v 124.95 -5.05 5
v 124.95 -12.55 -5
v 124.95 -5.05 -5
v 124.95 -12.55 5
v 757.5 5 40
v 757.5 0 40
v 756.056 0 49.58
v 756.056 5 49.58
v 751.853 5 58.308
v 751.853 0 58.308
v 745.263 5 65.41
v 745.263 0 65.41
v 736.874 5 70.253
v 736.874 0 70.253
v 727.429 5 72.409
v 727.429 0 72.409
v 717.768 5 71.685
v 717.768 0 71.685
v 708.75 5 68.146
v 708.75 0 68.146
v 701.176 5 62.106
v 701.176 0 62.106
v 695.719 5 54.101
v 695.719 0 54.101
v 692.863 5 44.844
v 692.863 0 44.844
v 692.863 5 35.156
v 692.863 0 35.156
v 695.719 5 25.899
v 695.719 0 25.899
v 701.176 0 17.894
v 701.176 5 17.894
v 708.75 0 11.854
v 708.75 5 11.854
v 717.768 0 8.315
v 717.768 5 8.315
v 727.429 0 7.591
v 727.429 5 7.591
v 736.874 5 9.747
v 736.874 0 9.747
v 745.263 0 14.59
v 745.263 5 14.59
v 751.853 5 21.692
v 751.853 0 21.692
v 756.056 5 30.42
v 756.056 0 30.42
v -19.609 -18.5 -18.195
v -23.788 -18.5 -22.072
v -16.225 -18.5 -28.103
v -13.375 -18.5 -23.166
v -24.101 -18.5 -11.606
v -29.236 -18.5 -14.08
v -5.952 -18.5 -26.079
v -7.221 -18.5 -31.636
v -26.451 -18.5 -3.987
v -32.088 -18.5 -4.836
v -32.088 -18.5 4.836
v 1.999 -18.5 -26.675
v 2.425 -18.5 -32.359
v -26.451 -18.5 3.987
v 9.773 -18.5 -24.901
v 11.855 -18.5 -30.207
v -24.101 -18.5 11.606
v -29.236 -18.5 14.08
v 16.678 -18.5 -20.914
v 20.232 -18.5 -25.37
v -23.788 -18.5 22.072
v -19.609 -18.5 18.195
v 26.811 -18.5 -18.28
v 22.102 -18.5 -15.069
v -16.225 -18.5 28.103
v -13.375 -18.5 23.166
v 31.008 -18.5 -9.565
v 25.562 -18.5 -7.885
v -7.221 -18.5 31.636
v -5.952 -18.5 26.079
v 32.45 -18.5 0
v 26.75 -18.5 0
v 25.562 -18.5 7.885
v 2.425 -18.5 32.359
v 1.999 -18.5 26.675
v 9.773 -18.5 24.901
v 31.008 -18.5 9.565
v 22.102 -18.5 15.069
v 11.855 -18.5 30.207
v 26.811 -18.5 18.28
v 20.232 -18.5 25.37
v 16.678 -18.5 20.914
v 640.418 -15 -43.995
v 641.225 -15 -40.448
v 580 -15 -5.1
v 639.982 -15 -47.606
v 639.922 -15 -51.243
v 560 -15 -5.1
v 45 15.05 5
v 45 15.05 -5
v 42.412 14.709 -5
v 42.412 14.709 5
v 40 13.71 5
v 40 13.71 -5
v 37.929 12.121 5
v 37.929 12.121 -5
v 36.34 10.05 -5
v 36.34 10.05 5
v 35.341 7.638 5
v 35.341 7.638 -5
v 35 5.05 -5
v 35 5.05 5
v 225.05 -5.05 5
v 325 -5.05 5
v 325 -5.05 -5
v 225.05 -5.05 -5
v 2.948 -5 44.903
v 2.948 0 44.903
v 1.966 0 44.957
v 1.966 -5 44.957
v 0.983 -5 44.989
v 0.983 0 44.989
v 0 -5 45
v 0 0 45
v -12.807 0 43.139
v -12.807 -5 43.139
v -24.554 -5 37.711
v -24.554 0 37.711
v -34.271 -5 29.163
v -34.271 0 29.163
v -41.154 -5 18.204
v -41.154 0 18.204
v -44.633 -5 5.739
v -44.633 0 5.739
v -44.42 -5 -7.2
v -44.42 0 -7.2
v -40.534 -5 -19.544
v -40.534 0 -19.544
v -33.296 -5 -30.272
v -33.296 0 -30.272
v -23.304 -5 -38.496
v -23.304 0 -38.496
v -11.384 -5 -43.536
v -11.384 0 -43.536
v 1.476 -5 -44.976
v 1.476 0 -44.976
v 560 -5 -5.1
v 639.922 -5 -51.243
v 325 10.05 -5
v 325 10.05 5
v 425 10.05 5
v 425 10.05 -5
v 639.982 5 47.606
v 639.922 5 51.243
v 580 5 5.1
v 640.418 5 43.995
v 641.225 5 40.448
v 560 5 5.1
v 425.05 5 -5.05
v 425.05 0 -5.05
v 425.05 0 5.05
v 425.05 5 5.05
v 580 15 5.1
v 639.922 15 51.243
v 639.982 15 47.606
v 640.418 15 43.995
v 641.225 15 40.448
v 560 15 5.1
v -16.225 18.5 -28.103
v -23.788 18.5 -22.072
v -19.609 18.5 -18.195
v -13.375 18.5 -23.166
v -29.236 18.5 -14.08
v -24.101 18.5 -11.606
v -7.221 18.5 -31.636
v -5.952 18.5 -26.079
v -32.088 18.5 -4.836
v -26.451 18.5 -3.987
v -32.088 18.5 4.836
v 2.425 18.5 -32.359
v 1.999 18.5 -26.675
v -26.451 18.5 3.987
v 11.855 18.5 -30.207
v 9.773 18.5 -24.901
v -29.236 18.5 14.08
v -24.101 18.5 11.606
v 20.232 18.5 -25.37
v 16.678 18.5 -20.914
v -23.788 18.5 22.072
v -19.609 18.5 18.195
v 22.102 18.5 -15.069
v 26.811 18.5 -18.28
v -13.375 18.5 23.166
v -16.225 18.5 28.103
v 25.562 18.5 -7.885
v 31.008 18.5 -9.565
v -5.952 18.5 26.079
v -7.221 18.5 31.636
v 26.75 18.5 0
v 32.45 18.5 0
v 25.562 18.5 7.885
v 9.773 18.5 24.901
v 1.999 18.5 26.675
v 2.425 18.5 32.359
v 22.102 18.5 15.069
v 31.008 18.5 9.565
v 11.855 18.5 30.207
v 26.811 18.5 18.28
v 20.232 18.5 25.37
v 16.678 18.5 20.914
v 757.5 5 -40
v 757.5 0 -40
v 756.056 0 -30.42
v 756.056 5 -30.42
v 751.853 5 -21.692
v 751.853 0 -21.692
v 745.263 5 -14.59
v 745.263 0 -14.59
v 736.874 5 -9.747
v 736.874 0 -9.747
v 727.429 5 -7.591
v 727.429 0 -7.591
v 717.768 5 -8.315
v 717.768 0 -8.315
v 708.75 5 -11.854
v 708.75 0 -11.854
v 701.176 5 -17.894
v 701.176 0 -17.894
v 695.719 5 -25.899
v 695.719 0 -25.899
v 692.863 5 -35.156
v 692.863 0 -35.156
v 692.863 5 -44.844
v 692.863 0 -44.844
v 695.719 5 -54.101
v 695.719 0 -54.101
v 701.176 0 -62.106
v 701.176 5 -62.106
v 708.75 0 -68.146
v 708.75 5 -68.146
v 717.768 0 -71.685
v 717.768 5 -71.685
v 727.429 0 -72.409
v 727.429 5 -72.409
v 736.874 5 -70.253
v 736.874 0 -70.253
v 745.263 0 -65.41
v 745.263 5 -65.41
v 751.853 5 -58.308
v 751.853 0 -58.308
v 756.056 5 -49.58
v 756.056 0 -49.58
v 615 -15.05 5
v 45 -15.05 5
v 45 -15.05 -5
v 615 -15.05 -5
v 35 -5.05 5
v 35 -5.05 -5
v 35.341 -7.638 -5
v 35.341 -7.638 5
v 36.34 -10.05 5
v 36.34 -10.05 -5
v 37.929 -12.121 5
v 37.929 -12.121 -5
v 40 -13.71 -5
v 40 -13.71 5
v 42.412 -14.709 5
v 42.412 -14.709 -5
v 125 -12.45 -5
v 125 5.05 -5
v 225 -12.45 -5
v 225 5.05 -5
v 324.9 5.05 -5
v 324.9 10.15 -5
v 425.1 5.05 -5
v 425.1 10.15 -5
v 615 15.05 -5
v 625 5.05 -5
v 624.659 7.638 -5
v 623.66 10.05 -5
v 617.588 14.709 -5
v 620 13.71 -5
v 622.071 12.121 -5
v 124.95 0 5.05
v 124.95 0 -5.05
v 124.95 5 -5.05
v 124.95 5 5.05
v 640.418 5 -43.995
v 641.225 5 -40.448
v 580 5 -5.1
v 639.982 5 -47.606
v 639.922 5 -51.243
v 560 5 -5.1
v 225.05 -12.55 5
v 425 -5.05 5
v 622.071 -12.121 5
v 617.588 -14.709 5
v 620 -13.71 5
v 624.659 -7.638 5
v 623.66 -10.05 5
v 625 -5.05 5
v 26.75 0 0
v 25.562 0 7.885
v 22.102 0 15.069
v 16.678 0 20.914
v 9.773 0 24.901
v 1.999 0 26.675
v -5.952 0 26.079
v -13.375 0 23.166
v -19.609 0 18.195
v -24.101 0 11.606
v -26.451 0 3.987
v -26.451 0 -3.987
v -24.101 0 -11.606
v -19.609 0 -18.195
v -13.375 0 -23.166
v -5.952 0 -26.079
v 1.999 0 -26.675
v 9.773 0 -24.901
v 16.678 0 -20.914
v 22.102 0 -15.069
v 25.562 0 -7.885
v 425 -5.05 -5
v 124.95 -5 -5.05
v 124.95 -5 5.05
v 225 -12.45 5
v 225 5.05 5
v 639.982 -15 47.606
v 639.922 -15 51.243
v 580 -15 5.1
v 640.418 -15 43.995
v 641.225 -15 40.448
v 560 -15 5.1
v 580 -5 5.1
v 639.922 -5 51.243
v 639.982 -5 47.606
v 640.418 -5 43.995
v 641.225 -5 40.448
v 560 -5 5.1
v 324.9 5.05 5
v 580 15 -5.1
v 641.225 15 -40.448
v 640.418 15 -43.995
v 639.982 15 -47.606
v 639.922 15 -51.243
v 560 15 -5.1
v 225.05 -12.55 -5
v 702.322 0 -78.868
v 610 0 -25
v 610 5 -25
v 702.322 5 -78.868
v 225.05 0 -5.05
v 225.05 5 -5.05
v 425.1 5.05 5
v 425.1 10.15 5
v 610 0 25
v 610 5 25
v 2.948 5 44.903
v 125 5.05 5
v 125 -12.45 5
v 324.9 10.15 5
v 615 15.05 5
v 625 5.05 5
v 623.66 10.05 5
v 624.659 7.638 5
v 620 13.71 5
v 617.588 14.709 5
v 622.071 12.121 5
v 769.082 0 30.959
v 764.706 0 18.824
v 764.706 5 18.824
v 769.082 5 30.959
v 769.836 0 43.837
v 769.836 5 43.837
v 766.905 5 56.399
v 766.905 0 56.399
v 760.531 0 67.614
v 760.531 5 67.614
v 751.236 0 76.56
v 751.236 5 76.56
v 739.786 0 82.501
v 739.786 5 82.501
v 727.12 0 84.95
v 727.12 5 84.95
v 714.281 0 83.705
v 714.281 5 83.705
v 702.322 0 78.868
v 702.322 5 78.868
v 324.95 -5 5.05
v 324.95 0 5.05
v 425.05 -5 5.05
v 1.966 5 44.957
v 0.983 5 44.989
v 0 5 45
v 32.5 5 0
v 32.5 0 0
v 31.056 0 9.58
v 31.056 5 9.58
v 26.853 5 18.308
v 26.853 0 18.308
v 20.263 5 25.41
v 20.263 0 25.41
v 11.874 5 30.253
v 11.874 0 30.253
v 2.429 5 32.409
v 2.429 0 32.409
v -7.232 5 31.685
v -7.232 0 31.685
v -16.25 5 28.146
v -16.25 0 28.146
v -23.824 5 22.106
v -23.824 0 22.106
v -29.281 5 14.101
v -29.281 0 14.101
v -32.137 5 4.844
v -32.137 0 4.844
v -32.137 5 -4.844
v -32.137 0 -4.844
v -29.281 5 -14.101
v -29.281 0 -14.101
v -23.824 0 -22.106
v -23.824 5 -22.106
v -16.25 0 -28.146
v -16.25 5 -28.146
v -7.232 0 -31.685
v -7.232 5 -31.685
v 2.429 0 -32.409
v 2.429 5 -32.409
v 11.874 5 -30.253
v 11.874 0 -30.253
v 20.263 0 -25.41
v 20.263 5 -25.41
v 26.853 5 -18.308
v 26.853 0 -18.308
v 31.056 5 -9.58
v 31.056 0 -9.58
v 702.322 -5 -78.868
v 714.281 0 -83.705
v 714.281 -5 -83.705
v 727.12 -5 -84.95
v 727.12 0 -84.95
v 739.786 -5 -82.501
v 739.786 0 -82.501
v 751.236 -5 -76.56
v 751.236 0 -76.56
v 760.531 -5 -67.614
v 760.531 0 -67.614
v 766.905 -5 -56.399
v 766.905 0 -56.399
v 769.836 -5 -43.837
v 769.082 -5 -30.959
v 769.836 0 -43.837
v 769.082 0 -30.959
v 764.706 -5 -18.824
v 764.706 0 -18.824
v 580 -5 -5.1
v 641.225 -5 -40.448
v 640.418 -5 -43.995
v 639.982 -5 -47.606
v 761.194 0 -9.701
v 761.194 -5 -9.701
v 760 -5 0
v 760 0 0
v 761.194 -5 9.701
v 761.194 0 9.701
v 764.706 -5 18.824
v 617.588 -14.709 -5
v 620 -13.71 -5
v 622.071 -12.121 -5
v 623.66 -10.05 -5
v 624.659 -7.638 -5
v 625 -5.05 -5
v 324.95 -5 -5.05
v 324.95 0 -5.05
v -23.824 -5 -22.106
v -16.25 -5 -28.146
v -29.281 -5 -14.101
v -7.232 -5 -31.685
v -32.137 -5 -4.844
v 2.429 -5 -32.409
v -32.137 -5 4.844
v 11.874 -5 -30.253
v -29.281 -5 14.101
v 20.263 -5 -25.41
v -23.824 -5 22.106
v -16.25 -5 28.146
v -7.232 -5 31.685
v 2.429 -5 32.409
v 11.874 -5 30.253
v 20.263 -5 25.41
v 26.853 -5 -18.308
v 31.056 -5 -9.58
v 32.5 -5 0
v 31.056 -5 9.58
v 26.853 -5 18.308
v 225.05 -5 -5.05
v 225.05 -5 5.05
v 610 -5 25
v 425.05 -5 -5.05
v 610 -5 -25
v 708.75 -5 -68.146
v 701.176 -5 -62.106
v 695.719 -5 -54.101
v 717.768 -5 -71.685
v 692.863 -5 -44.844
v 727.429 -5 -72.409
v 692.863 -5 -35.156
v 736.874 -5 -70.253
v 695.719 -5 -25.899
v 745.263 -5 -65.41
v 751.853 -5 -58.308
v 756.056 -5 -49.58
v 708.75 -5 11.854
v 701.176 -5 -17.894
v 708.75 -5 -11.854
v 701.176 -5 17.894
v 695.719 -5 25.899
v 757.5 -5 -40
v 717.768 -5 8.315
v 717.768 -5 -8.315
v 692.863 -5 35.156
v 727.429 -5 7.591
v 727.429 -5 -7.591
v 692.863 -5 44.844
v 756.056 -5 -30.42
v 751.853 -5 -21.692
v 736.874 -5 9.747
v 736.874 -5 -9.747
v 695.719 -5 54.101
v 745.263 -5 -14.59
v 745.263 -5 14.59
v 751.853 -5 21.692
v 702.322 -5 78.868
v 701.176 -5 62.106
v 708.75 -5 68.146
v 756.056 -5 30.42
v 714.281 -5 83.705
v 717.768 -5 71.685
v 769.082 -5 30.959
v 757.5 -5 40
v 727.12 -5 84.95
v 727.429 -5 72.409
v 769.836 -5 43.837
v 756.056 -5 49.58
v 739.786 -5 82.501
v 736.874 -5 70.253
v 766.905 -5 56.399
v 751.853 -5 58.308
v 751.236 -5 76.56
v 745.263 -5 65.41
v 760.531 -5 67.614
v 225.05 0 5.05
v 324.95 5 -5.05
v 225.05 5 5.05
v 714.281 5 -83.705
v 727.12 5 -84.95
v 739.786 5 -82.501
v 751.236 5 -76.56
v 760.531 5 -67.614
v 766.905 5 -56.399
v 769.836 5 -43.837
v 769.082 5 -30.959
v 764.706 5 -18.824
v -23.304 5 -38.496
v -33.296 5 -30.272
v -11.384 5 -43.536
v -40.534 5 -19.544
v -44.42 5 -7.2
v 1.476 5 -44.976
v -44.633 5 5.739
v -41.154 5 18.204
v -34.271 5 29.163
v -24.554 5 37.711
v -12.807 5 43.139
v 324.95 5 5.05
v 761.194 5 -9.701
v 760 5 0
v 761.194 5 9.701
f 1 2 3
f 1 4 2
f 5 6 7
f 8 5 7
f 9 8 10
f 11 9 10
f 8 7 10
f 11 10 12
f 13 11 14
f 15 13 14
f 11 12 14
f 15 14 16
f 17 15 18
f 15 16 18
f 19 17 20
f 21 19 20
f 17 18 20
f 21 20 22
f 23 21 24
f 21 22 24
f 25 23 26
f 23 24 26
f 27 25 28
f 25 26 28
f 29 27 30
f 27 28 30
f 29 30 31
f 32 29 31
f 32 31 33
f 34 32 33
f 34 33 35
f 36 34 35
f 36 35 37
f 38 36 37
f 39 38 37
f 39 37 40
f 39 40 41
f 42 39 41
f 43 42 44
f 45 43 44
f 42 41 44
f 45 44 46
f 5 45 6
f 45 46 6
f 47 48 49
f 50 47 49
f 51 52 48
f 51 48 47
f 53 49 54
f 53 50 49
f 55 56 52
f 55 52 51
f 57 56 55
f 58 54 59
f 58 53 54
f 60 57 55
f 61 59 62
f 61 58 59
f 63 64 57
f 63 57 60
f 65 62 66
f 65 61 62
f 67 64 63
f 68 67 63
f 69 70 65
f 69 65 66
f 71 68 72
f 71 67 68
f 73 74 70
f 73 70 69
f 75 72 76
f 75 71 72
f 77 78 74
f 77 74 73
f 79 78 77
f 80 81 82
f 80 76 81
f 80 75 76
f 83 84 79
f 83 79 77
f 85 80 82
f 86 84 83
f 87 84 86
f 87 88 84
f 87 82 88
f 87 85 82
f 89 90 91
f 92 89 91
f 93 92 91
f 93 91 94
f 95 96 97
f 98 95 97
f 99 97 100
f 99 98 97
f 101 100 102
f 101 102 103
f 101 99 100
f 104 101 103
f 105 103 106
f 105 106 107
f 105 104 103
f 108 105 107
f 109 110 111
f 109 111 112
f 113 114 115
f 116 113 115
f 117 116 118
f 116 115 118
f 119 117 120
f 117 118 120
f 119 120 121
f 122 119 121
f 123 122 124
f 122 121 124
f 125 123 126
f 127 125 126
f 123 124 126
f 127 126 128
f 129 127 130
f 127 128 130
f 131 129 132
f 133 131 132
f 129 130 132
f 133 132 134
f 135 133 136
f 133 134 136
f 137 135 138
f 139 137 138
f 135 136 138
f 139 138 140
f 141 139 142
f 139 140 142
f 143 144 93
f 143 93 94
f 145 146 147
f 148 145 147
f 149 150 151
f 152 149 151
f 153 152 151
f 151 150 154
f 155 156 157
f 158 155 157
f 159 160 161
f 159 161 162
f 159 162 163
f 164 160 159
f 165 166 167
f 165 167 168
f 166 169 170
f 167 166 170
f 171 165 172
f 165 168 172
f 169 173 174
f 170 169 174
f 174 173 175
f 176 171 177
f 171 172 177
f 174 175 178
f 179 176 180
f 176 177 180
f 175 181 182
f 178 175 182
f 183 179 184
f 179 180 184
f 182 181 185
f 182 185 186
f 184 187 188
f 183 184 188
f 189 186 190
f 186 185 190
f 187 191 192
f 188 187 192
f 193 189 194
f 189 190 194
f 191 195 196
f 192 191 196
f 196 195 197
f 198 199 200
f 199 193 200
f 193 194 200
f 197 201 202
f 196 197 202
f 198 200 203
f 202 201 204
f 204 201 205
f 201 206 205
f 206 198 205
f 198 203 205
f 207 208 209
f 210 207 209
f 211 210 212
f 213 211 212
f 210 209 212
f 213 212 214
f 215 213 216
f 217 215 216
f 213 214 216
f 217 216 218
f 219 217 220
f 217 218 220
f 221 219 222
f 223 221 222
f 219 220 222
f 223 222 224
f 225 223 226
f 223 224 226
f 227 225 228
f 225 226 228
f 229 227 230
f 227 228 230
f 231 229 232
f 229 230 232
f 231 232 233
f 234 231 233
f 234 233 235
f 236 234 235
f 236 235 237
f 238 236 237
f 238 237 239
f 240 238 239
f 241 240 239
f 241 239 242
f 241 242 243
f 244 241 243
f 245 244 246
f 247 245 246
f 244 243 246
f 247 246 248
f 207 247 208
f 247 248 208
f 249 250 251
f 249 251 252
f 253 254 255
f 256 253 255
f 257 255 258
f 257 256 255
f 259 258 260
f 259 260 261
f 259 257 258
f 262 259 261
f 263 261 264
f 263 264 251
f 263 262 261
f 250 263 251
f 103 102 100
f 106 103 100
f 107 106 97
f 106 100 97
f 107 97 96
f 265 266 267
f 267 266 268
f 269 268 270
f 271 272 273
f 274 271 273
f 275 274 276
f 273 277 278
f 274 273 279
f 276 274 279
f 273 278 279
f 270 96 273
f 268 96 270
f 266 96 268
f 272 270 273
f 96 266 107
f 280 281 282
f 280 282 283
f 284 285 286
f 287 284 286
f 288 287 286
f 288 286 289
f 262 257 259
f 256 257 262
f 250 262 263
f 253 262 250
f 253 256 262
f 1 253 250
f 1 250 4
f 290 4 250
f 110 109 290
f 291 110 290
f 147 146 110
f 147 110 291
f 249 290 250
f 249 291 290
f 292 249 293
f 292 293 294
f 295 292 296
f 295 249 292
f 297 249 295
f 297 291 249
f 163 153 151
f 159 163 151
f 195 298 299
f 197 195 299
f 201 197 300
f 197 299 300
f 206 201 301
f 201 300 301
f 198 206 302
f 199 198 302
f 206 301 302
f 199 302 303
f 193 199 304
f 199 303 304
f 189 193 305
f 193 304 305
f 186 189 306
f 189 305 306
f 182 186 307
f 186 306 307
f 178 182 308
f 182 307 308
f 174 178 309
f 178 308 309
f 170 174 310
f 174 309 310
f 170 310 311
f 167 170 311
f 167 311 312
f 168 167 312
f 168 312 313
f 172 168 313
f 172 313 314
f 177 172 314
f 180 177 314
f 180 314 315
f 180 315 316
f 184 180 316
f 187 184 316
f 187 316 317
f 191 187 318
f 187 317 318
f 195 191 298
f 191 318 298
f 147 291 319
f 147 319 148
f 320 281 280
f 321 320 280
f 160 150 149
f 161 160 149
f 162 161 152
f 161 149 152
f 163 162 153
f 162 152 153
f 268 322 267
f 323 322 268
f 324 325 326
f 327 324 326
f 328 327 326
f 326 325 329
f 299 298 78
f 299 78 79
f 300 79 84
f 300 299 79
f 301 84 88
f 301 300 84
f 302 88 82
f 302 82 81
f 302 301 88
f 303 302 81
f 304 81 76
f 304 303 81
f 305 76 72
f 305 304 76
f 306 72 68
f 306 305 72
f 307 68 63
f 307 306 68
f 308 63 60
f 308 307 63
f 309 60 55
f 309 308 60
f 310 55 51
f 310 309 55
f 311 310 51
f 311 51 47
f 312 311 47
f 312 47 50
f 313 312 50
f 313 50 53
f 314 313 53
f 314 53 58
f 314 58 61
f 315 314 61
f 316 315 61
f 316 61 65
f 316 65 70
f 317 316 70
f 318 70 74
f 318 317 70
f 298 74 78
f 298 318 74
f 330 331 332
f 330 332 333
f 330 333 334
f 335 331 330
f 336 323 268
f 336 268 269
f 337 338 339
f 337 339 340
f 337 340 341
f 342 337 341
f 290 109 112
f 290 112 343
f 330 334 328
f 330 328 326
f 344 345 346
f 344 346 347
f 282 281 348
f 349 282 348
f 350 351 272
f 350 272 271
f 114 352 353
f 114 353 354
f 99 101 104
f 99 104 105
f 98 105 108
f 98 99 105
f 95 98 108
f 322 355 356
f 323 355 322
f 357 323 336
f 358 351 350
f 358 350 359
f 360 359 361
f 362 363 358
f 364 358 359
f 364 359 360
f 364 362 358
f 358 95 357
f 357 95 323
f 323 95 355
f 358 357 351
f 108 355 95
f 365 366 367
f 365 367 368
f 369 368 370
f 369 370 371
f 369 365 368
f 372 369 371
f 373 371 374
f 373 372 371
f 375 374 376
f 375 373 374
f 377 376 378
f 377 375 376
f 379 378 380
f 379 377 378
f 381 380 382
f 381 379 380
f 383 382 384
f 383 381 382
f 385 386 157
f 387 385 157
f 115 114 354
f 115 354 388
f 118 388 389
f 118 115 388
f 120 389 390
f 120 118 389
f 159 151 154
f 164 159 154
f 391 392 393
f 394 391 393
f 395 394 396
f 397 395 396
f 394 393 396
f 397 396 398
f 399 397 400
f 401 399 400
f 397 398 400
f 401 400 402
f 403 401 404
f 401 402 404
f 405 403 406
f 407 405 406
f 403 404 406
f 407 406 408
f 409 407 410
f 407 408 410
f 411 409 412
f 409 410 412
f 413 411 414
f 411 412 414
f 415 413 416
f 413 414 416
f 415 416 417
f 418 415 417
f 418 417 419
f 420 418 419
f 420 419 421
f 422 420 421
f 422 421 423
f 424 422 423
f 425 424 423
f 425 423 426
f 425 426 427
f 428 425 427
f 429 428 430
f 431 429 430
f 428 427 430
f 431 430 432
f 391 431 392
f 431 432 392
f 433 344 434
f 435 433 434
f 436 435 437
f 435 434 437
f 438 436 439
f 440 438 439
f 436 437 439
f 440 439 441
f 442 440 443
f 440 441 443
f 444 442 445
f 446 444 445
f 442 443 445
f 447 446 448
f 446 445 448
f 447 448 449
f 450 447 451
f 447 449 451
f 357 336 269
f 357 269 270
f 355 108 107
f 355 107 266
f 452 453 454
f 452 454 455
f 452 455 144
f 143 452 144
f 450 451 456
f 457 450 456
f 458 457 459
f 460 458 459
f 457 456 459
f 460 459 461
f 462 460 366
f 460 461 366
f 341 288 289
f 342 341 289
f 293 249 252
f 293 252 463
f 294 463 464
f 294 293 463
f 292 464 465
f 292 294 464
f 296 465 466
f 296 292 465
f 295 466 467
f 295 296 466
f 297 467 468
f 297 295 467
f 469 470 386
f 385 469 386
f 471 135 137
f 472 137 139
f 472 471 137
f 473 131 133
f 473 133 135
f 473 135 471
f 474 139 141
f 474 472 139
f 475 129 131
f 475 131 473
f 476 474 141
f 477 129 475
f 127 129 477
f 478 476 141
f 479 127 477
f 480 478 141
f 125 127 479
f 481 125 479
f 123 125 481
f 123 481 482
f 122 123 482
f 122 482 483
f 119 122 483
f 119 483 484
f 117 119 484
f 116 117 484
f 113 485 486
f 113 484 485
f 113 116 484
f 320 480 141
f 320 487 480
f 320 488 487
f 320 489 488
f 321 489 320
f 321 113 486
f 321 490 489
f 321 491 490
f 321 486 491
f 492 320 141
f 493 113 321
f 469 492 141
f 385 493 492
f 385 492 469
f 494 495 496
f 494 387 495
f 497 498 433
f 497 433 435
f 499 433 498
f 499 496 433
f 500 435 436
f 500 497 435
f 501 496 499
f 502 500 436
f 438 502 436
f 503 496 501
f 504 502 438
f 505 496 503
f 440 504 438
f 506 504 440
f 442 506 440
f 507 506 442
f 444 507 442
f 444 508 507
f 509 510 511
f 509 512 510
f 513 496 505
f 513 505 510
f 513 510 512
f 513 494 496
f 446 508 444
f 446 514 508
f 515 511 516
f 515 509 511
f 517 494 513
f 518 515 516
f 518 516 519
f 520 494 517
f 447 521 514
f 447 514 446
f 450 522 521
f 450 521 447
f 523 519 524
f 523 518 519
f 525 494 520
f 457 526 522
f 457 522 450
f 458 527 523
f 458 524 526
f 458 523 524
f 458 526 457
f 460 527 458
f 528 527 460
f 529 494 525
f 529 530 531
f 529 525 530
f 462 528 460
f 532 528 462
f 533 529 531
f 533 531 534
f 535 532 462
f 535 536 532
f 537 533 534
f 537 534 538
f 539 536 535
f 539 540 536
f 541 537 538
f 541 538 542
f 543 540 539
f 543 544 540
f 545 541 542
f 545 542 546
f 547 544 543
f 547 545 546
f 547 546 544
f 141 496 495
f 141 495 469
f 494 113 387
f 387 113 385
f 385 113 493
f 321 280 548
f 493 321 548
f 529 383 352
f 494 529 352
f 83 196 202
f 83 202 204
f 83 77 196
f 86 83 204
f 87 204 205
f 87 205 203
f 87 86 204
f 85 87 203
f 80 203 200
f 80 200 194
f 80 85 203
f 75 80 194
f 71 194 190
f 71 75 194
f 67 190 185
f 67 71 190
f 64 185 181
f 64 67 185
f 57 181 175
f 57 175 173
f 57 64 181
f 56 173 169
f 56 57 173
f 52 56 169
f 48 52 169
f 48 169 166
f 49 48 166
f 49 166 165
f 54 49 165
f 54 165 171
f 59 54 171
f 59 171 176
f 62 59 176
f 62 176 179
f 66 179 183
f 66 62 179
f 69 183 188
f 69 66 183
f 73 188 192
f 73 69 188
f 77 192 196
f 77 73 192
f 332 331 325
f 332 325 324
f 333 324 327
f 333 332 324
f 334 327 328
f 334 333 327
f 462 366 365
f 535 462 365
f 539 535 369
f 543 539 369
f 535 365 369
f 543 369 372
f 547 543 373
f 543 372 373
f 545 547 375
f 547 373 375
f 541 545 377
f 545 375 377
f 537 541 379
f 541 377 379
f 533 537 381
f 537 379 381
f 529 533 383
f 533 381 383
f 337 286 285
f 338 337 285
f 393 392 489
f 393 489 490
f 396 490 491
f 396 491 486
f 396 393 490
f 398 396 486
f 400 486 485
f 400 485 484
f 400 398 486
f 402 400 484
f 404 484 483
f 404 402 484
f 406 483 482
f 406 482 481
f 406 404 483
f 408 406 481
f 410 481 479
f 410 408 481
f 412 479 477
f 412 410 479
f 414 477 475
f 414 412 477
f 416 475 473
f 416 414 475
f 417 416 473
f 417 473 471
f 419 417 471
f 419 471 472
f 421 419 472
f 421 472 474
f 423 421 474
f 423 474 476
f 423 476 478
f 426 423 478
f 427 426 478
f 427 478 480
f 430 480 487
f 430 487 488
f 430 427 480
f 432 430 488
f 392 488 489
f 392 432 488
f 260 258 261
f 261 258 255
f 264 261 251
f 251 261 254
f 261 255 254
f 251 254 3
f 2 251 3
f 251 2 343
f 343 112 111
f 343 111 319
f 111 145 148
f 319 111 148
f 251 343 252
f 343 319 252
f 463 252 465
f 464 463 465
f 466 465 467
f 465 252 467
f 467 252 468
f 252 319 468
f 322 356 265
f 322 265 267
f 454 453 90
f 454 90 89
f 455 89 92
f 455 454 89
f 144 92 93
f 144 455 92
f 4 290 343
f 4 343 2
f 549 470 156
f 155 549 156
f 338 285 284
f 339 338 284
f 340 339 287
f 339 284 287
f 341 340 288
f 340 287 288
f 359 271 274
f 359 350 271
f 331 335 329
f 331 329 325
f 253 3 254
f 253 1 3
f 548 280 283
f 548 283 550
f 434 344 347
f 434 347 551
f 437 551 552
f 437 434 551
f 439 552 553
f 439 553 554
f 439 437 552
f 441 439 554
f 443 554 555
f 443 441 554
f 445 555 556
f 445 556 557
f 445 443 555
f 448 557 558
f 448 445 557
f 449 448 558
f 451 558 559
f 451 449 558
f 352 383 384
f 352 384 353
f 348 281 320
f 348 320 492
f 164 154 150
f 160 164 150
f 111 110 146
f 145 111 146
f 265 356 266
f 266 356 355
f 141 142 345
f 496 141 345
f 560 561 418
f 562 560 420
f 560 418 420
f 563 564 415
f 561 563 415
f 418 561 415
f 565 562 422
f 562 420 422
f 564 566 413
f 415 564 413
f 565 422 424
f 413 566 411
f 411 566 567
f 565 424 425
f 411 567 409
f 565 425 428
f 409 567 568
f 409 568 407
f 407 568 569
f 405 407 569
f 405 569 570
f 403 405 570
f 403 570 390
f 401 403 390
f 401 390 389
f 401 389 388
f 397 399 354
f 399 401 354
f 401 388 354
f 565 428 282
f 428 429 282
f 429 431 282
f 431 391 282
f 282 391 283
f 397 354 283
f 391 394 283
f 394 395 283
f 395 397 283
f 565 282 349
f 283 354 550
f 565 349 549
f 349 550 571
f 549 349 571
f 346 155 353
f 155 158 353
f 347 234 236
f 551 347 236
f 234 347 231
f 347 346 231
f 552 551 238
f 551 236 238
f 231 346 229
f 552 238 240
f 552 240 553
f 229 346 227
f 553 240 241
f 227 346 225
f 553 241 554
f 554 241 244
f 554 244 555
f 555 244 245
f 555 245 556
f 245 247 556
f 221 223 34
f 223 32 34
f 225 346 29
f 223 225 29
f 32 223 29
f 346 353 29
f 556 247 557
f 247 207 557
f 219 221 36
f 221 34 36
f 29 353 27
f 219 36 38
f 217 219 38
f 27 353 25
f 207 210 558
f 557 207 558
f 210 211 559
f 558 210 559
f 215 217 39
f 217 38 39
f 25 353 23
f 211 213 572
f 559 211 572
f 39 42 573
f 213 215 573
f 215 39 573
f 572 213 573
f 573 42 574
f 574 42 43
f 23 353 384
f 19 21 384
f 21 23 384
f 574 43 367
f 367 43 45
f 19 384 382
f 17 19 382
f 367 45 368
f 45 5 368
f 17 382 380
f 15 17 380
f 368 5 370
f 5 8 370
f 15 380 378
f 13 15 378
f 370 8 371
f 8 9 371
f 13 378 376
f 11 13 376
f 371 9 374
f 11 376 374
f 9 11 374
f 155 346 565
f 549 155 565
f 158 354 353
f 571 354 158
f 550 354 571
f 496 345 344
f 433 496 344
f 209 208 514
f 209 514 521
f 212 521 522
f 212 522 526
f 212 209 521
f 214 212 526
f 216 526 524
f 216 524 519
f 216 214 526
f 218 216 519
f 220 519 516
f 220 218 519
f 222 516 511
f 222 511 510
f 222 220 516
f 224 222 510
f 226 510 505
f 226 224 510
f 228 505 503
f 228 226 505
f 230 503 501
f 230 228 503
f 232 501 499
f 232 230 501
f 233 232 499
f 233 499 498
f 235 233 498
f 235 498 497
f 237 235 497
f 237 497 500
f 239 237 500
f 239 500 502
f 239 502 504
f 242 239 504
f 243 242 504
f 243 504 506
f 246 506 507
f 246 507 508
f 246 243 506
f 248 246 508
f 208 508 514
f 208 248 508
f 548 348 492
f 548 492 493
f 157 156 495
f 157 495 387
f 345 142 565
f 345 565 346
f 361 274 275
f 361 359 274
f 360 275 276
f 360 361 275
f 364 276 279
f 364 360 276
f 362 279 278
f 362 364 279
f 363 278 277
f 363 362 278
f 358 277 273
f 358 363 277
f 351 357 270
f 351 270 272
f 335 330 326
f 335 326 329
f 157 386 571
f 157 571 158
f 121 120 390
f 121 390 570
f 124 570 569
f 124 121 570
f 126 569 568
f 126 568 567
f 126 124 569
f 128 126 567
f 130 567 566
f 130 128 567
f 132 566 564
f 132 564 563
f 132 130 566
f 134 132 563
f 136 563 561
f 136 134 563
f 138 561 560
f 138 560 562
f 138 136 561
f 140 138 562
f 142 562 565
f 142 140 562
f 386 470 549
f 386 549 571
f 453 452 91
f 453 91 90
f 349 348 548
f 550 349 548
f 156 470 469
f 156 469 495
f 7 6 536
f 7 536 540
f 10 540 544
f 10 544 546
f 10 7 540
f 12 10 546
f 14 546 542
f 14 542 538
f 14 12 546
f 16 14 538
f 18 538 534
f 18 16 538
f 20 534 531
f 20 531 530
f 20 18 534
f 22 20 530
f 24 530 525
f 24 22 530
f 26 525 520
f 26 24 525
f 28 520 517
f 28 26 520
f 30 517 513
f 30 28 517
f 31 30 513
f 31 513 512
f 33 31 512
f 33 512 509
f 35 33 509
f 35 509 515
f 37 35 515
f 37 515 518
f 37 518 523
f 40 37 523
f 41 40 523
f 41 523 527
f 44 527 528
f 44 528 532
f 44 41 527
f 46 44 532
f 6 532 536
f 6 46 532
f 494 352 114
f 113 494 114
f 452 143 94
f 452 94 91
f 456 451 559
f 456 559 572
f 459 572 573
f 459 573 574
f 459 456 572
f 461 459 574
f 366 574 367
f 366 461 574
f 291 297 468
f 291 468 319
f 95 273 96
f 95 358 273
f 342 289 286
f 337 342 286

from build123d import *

# Parameters (mm, degrees)
F0_R          = 32.5
F0_W          = 100.1
F0_H          = 10.1
F1_DEPTH      = 5
F1_DEPTH_BACK = 5
F2_W          = 100
F2_H          = 17.5
F3_DEPTH      = 5
F3_DEPTH_BACK = 5
F2_H_2        = 15.1
F5_DEPTH      = 10
F7_R          = 32.45
F7_R_2        = 26.75
F8_DEPTH      = 18.5
F8_DEPTH_BACK = 18.5


with BuildPart() as f1:
    # F0 (on Front) → F1 (new body, two sides)
    with BuildSketch(Plane.XZ) as f1_sk:
        with BuildLine():
            ThreePointArc((1.4764017016, -44.9757739012), (32.3375793511, -31.2934651599), (45, 0))
            ThreePointArc((45, 0), (32.8454281088, 30.7600041019), (2.9476510067, 44.9033557047))
            Line((2.9476510067, 44.9033557047), (0, 45))
            ThreePointArc((0, 45), (-44.9939430677, -0.7383002249), (1.4764017016, -44.9757739012))
        make_face()
        Circle(F0_R, mode=Mode.SUBTRACT)
        with BuildLine():
            ThreePointArc((2.9476510067, 44.9033557047), (32.8454281088, 30.7600041019), (45, 0))
            ThreePointArc((45, 0), (32.3375793511, -31.2934651599), (1.4764017016, -44.9757739012))
            Line((1.4764017016, -44.9757739012), (610, -25))
            Line((610, -25), (702.3216164051, -78.8676075611))
            ThreePointArc((702.3216164051, -78.8676075611), (756.2058769896, -72.4221103772), (764.7058823529, -18.8235294118))
            ThreePointArc((764.7058823529, -18.8235294118), (760, 0), (764.7058823529, 18.8235294118))
            ThreePointArc((764.7058823529, 18.8235294118), (693.7941230104, 7.5778896228), (702.3216164051, 78.8676075611))
            Line((702.3216164051, 78.8676075611), (610, 25))
            Line((610, 25), (2.9476510067, 44.9033557047))
        make_face()
        with Locations((725, -40)):
            Circle(F0_R, mode=Mode.SUBTRACT)
        with Locations((175, 0)):
            Rectangle(F0_W, F0_H, mode=Mode.SUBTRACT)
        with Locations((375, 0)):
            Rectangle(F0_W, F0_H, mode=Mode.SUBTRACT)
        with BuildLine():
            Line((0, 45), (2.9476510067, 44.9033557047))
            ThreePointArc((2.9476510067, 44.9033557047), (1.4746174569, 44.9758324365), (0, 45))
        make_face()
        with BuildLine():
            ThreePointArc((770, 40), (747.4106307166, 79.0226041018), (702.3216164051, 78.8676075611))
            ThreePointArc((702.3216164051, 78.8676075611), (693.7941230104, 7.5778896228), (764.7058823529, 18.8235294118))
            ThreePointArc((764.7058823529, 18.8235294118), (768.6564125065, 29.0858968734), (770, 40))
        make_face()
        with Locations((725, 40)):
            Circle(F0_R, mode=Mode.SUBTRACT)
    extrude(amount=F1_DEPTH)
    extrude(f1_sk.sketch, amount=-F1_DEPTH_BACK)


with BuildPart() as f3:
    # F2 (on Top) → F3 (new body, two sides)
    with BuildSketch(Plane.XY) as f3_sk:
        with BuildLine():
            Line((615, 15.05), (45, 15.05))
            ThreePointArc((45, 15.05), (37.9289321881, 12.1210678119), (35, 5.05))
            Line((35, 5.05), (125, 5.05))
            Line((125, 5.05), (225, 5.05))
            Line((225, 5.05), (324.9, 5.05))
            Line((324.9, 5.05), (324.9, 10.15))
            Line((324.9, 10.15), (425.1, 10.15))
            Line((425.1, 10.15), (425.1, 5.05))
            Line((425.1, 5.05), (625, 5.05))
            ThreePointArc((625, 5.05), (622.0710678119, 12.1210678119), (615, 15.05))
        make_face()
        with Locations((175, -3.7)):
            Rectangle(F2_W, F2_H)
    extrude(amount=F3_DEPTH)
    extrude(f3_sk.sketch, amount=-F3_DEPTH_BACK)


with BuildPart() as f3b:
    # F2 (on Top) → F3, piece 2 (new body, two sides)
    with BuildSketch(Plane.XY) as f3_2_sk:
        with BuildLine():
            ThreePointArc((35, -5.05), (37.9289321881, -12.1210678119), (45, -15.05))
            Line((45, -15.05), (615, -15.05))
            ThreePointArc((615, -15.05), (622.0710678119, -12.1210678119), (625, -5.05))
            Line((625, -5.05), (425, -5.05))
            Line((425, -5.05), (325, -5.05))
            Line((325, -5.05), (225.05, -5.05))
            Line((225.05, -5.05), (225.05, -12.55))
            Line((225.05, -12.55), (124.95, -12.55))
            Line((124.95, -12.55), (124.95, -5.05))
            Line((124.95, -5.05), (35, -5.05))
        make_face()
        with Locations((375, 2.5)):
            Rectangle(F2_W, F2_H_2)
    extrude(amount=F3_DEPTH)
    extrude(f3_2_sk.sketch, amount=-F3_DEPTH_BACK)


with BuildPart() as f5:
    # F4 (on face) → F5 (new body)
    with BuildSketch(Plane(origin=(0, 5, 0), x_dir=(-1, 0, 0), z_dir=(0, 1, 0))):
        with BuildLine():
            Line((-580, -5.1), (-641.2246966978, -40.4480951195))
            ThreePointArc((-641.2246966978, -40.4480951195), (-640.1528154614, -45.7947973022), (-639.9220160607, -51.2429974868))
            Line((-639.9220160607, -51.2429974868), (-560, -5.1))
            Line((-560, -5.1), (-580, -5.1))
        make_face()
    extrude(amount=F5_DEPTH)


with BuildPart() as f5b:
    # F4 (on face) → F5, piece 2 (new body)
    with BuildSketch(Plane(origin=(0, 5, 0), x_dir=(-1, 0, 0), z_dir=(0, 1, 0))):
        with BuildLine():
            Line((-641.2246966978, 40.4480951195), (-580, 5.1))
            Line((-580, 5.1), (-560, 5.1))
            Line((-560, 5.1), (-639.9220160607, 51.2429974868))
            ThreePointArc((-639.9220160607, 51.2429974868), (-640.1528154614, 45.7947973022), (-641.2246966978, 40.4480951195))
        make_face()
    extrude(amount=F5_DEPTH)


with BuildPart() as f6_1:
    # F6: instance of F5b
    add(f5b.part.mirror(Plane.XZ))


with BuildPart() as f6_2:
    # F6: instance of F5
    add(f5.part.mirror(Plane.XZ))


with BuildPart() as f8:
    # F7 (on Front) → F8 (new body, two sides)
    with BuildSketch(Plane.XZ) as f8_sk:
        Circle(F7_R)
        Circle(F7_R_2, mode=Mode.SUBTRACT)
    extrude(amount=F8_DEPTH)
    extrude(f8_sk.sketch, amount=-F8_DEPTH_BACK)


solid = Compound([f1.part, f3.part, f3b.part, f5.part, f5b.part, f6_1.part, f6_2.part, f8.part])
